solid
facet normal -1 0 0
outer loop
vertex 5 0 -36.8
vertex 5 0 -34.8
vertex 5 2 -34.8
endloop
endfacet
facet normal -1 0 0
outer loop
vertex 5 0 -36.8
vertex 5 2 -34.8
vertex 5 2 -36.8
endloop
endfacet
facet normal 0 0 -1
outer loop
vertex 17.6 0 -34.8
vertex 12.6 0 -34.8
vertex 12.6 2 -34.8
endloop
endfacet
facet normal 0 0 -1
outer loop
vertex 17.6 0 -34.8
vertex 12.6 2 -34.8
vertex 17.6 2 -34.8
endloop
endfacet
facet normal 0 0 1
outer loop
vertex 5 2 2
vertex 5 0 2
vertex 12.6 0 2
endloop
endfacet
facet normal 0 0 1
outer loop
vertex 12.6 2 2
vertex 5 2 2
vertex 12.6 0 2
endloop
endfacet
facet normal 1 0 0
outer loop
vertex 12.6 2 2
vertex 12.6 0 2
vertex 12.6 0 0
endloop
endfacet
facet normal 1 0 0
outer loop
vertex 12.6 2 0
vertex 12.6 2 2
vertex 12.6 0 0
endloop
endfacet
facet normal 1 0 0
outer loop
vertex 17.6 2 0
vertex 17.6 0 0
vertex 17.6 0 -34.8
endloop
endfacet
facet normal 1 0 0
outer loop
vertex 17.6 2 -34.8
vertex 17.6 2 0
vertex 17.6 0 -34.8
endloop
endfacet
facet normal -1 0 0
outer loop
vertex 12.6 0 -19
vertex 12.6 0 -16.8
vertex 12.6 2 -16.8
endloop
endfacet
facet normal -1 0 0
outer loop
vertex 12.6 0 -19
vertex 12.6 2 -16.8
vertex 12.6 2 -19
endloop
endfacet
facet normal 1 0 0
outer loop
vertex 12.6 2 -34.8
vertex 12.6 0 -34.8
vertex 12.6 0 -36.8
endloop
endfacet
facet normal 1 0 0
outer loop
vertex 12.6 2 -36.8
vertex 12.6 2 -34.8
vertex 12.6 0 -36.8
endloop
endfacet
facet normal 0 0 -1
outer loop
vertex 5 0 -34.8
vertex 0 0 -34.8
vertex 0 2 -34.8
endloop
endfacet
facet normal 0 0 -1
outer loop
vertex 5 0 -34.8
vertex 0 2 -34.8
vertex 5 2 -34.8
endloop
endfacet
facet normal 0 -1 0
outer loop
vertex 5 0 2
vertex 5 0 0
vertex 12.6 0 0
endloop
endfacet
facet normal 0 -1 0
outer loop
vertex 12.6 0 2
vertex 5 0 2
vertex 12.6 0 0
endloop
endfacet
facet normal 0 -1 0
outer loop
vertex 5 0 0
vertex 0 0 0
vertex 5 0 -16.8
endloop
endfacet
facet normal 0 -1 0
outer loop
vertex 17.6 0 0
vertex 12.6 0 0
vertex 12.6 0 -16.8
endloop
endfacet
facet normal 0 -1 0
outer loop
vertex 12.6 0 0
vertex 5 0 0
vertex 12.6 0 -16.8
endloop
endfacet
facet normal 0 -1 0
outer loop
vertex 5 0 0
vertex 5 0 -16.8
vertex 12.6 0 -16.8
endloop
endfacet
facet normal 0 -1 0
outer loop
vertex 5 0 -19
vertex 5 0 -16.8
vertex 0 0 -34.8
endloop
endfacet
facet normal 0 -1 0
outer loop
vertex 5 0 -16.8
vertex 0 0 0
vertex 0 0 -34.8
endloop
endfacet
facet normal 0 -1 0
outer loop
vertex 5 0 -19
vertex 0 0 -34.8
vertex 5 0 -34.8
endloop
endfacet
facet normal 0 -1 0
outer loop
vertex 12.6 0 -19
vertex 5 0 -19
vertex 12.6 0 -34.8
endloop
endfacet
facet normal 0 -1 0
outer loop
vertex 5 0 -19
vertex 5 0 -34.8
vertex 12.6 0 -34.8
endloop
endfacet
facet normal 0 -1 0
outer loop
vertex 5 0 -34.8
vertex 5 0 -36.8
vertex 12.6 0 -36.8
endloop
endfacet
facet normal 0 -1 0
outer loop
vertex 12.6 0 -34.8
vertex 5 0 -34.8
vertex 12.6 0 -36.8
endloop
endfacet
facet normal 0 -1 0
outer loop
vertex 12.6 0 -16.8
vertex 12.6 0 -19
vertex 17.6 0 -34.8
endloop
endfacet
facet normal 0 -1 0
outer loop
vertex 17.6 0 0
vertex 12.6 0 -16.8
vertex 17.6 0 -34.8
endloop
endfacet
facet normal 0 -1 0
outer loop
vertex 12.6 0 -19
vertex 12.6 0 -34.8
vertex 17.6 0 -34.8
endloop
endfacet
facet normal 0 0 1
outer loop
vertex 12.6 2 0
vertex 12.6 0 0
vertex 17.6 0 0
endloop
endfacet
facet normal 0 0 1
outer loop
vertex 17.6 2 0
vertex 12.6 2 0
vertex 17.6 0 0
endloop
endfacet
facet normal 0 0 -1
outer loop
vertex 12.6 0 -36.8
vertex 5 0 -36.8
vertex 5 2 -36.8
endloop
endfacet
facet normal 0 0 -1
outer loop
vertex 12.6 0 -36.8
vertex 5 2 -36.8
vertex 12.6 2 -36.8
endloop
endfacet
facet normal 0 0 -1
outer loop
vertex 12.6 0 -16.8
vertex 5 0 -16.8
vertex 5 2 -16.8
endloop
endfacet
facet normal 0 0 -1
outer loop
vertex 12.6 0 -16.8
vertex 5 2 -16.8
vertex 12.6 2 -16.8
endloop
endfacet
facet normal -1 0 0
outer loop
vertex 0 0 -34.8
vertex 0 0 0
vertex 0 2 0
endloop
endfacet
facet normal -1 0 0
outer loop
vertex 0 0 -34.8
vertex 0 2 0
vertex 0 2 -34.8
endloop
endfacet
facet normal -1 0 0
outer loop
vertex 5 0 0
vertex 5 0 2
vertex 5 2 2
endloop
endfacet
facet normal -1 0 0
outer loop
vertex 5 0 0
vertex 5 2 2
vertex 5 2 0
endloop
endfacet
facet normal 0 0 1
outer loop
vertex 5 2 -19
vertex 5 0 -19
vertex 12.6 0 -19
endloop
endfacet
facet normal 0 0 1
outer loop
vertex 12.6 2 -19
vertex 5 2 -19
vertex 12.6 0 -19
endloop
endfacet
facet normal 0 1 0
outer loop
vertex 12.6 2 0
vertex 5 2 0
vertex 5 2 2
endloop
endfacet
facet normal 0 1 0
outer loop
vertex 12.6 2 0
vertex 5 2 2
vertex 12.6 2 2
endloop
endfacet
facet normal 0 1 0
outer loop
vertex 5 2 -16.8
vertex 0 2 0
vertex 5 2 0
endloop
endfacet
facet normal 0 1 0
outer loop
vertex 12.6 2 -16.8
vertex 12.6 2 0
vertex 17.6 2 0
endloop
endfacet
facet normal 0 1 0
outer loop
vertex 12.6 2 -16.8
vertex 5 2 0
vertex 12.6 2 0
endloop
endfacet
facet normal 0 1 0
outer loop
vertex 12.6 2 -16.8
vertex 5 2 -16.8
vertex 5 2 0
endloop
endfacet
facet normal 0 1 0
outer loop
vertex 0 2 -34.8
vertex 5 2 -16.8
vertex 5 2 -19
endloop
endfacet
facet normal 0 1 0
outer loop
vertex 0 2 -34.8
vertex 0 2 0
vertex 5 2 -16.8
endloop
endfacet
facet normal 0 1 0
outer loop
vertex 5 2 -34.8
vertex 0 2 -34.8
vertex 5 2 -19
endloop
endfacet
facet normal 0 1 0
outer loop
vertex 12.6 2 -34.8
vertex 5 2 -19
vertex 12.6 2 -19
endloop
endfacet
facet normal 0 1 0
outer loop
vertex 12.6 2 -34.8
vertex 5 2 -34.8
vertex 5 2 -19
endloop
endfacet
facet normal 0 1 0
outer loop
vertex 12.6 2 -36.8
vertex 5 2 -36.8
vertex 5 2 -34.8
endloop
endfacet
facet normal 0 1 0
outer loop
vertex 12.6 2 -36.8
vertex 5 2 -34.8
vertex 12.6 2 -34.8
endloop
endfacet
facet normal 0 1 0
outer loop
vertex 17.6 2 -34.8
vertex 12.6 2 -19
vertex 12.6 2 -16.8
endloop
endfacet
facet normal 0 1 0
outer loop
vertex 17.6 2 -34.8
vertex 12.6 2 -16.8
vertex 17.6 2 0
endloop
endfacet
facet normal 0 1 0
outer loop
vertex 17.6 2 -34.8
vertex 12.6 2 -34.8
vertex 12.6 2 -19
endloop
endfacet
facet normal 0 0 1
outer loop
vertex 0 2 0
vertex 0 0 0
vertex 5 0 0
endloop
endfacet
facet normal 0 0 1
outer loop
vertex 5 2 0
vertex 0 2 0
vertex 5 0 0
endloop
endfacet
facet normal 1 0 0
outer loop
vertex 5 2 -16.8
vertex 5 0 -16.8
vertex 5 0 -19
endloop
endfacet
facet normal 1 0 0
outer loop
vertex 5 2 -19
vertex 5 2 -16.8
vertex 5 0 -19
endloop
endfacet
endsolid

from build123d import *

# Parameters (mm, degrees)
SKETCH_1_W      = 17.6
SKETCH_1_H      = 34.8
SKETCH_1_W_2    = 7.6
SKETCH_1_H_2    = 2.2
SKETCH_1_H_3    = 2
EXTRUDE_1_DEPTH = 2


with BuildPart() as part:
    # 草图1 → 凸台-拉伸1 (new body)
    with BuildSketch(Plane(origin=(0, 0, 0), x_dir=(1, 0, 0), z_dir=(0, 1, 0))):
        with Locations((8.8, 17.4)):
            Rectangle(SKETCH_1_W, SKETCH_1_H)
        with Locations((8.8, 17.9)):
            Rectangle(SKETCH_1_W_2, SKETCH_1_H_2, mode=Mode.SUBTRACT)
        with Locations((8.8, -1)):
            Rectangle(SKETCH_1_W_2, SKETCH_1_H_3)
        with Locations((8.8, 35.8)):
            Rectangle(SKETCH_1_W_2, SKETCH_1_H_3)
    extrude(amount=EXTRUDE_1_DEPTH)


solid = part.part
